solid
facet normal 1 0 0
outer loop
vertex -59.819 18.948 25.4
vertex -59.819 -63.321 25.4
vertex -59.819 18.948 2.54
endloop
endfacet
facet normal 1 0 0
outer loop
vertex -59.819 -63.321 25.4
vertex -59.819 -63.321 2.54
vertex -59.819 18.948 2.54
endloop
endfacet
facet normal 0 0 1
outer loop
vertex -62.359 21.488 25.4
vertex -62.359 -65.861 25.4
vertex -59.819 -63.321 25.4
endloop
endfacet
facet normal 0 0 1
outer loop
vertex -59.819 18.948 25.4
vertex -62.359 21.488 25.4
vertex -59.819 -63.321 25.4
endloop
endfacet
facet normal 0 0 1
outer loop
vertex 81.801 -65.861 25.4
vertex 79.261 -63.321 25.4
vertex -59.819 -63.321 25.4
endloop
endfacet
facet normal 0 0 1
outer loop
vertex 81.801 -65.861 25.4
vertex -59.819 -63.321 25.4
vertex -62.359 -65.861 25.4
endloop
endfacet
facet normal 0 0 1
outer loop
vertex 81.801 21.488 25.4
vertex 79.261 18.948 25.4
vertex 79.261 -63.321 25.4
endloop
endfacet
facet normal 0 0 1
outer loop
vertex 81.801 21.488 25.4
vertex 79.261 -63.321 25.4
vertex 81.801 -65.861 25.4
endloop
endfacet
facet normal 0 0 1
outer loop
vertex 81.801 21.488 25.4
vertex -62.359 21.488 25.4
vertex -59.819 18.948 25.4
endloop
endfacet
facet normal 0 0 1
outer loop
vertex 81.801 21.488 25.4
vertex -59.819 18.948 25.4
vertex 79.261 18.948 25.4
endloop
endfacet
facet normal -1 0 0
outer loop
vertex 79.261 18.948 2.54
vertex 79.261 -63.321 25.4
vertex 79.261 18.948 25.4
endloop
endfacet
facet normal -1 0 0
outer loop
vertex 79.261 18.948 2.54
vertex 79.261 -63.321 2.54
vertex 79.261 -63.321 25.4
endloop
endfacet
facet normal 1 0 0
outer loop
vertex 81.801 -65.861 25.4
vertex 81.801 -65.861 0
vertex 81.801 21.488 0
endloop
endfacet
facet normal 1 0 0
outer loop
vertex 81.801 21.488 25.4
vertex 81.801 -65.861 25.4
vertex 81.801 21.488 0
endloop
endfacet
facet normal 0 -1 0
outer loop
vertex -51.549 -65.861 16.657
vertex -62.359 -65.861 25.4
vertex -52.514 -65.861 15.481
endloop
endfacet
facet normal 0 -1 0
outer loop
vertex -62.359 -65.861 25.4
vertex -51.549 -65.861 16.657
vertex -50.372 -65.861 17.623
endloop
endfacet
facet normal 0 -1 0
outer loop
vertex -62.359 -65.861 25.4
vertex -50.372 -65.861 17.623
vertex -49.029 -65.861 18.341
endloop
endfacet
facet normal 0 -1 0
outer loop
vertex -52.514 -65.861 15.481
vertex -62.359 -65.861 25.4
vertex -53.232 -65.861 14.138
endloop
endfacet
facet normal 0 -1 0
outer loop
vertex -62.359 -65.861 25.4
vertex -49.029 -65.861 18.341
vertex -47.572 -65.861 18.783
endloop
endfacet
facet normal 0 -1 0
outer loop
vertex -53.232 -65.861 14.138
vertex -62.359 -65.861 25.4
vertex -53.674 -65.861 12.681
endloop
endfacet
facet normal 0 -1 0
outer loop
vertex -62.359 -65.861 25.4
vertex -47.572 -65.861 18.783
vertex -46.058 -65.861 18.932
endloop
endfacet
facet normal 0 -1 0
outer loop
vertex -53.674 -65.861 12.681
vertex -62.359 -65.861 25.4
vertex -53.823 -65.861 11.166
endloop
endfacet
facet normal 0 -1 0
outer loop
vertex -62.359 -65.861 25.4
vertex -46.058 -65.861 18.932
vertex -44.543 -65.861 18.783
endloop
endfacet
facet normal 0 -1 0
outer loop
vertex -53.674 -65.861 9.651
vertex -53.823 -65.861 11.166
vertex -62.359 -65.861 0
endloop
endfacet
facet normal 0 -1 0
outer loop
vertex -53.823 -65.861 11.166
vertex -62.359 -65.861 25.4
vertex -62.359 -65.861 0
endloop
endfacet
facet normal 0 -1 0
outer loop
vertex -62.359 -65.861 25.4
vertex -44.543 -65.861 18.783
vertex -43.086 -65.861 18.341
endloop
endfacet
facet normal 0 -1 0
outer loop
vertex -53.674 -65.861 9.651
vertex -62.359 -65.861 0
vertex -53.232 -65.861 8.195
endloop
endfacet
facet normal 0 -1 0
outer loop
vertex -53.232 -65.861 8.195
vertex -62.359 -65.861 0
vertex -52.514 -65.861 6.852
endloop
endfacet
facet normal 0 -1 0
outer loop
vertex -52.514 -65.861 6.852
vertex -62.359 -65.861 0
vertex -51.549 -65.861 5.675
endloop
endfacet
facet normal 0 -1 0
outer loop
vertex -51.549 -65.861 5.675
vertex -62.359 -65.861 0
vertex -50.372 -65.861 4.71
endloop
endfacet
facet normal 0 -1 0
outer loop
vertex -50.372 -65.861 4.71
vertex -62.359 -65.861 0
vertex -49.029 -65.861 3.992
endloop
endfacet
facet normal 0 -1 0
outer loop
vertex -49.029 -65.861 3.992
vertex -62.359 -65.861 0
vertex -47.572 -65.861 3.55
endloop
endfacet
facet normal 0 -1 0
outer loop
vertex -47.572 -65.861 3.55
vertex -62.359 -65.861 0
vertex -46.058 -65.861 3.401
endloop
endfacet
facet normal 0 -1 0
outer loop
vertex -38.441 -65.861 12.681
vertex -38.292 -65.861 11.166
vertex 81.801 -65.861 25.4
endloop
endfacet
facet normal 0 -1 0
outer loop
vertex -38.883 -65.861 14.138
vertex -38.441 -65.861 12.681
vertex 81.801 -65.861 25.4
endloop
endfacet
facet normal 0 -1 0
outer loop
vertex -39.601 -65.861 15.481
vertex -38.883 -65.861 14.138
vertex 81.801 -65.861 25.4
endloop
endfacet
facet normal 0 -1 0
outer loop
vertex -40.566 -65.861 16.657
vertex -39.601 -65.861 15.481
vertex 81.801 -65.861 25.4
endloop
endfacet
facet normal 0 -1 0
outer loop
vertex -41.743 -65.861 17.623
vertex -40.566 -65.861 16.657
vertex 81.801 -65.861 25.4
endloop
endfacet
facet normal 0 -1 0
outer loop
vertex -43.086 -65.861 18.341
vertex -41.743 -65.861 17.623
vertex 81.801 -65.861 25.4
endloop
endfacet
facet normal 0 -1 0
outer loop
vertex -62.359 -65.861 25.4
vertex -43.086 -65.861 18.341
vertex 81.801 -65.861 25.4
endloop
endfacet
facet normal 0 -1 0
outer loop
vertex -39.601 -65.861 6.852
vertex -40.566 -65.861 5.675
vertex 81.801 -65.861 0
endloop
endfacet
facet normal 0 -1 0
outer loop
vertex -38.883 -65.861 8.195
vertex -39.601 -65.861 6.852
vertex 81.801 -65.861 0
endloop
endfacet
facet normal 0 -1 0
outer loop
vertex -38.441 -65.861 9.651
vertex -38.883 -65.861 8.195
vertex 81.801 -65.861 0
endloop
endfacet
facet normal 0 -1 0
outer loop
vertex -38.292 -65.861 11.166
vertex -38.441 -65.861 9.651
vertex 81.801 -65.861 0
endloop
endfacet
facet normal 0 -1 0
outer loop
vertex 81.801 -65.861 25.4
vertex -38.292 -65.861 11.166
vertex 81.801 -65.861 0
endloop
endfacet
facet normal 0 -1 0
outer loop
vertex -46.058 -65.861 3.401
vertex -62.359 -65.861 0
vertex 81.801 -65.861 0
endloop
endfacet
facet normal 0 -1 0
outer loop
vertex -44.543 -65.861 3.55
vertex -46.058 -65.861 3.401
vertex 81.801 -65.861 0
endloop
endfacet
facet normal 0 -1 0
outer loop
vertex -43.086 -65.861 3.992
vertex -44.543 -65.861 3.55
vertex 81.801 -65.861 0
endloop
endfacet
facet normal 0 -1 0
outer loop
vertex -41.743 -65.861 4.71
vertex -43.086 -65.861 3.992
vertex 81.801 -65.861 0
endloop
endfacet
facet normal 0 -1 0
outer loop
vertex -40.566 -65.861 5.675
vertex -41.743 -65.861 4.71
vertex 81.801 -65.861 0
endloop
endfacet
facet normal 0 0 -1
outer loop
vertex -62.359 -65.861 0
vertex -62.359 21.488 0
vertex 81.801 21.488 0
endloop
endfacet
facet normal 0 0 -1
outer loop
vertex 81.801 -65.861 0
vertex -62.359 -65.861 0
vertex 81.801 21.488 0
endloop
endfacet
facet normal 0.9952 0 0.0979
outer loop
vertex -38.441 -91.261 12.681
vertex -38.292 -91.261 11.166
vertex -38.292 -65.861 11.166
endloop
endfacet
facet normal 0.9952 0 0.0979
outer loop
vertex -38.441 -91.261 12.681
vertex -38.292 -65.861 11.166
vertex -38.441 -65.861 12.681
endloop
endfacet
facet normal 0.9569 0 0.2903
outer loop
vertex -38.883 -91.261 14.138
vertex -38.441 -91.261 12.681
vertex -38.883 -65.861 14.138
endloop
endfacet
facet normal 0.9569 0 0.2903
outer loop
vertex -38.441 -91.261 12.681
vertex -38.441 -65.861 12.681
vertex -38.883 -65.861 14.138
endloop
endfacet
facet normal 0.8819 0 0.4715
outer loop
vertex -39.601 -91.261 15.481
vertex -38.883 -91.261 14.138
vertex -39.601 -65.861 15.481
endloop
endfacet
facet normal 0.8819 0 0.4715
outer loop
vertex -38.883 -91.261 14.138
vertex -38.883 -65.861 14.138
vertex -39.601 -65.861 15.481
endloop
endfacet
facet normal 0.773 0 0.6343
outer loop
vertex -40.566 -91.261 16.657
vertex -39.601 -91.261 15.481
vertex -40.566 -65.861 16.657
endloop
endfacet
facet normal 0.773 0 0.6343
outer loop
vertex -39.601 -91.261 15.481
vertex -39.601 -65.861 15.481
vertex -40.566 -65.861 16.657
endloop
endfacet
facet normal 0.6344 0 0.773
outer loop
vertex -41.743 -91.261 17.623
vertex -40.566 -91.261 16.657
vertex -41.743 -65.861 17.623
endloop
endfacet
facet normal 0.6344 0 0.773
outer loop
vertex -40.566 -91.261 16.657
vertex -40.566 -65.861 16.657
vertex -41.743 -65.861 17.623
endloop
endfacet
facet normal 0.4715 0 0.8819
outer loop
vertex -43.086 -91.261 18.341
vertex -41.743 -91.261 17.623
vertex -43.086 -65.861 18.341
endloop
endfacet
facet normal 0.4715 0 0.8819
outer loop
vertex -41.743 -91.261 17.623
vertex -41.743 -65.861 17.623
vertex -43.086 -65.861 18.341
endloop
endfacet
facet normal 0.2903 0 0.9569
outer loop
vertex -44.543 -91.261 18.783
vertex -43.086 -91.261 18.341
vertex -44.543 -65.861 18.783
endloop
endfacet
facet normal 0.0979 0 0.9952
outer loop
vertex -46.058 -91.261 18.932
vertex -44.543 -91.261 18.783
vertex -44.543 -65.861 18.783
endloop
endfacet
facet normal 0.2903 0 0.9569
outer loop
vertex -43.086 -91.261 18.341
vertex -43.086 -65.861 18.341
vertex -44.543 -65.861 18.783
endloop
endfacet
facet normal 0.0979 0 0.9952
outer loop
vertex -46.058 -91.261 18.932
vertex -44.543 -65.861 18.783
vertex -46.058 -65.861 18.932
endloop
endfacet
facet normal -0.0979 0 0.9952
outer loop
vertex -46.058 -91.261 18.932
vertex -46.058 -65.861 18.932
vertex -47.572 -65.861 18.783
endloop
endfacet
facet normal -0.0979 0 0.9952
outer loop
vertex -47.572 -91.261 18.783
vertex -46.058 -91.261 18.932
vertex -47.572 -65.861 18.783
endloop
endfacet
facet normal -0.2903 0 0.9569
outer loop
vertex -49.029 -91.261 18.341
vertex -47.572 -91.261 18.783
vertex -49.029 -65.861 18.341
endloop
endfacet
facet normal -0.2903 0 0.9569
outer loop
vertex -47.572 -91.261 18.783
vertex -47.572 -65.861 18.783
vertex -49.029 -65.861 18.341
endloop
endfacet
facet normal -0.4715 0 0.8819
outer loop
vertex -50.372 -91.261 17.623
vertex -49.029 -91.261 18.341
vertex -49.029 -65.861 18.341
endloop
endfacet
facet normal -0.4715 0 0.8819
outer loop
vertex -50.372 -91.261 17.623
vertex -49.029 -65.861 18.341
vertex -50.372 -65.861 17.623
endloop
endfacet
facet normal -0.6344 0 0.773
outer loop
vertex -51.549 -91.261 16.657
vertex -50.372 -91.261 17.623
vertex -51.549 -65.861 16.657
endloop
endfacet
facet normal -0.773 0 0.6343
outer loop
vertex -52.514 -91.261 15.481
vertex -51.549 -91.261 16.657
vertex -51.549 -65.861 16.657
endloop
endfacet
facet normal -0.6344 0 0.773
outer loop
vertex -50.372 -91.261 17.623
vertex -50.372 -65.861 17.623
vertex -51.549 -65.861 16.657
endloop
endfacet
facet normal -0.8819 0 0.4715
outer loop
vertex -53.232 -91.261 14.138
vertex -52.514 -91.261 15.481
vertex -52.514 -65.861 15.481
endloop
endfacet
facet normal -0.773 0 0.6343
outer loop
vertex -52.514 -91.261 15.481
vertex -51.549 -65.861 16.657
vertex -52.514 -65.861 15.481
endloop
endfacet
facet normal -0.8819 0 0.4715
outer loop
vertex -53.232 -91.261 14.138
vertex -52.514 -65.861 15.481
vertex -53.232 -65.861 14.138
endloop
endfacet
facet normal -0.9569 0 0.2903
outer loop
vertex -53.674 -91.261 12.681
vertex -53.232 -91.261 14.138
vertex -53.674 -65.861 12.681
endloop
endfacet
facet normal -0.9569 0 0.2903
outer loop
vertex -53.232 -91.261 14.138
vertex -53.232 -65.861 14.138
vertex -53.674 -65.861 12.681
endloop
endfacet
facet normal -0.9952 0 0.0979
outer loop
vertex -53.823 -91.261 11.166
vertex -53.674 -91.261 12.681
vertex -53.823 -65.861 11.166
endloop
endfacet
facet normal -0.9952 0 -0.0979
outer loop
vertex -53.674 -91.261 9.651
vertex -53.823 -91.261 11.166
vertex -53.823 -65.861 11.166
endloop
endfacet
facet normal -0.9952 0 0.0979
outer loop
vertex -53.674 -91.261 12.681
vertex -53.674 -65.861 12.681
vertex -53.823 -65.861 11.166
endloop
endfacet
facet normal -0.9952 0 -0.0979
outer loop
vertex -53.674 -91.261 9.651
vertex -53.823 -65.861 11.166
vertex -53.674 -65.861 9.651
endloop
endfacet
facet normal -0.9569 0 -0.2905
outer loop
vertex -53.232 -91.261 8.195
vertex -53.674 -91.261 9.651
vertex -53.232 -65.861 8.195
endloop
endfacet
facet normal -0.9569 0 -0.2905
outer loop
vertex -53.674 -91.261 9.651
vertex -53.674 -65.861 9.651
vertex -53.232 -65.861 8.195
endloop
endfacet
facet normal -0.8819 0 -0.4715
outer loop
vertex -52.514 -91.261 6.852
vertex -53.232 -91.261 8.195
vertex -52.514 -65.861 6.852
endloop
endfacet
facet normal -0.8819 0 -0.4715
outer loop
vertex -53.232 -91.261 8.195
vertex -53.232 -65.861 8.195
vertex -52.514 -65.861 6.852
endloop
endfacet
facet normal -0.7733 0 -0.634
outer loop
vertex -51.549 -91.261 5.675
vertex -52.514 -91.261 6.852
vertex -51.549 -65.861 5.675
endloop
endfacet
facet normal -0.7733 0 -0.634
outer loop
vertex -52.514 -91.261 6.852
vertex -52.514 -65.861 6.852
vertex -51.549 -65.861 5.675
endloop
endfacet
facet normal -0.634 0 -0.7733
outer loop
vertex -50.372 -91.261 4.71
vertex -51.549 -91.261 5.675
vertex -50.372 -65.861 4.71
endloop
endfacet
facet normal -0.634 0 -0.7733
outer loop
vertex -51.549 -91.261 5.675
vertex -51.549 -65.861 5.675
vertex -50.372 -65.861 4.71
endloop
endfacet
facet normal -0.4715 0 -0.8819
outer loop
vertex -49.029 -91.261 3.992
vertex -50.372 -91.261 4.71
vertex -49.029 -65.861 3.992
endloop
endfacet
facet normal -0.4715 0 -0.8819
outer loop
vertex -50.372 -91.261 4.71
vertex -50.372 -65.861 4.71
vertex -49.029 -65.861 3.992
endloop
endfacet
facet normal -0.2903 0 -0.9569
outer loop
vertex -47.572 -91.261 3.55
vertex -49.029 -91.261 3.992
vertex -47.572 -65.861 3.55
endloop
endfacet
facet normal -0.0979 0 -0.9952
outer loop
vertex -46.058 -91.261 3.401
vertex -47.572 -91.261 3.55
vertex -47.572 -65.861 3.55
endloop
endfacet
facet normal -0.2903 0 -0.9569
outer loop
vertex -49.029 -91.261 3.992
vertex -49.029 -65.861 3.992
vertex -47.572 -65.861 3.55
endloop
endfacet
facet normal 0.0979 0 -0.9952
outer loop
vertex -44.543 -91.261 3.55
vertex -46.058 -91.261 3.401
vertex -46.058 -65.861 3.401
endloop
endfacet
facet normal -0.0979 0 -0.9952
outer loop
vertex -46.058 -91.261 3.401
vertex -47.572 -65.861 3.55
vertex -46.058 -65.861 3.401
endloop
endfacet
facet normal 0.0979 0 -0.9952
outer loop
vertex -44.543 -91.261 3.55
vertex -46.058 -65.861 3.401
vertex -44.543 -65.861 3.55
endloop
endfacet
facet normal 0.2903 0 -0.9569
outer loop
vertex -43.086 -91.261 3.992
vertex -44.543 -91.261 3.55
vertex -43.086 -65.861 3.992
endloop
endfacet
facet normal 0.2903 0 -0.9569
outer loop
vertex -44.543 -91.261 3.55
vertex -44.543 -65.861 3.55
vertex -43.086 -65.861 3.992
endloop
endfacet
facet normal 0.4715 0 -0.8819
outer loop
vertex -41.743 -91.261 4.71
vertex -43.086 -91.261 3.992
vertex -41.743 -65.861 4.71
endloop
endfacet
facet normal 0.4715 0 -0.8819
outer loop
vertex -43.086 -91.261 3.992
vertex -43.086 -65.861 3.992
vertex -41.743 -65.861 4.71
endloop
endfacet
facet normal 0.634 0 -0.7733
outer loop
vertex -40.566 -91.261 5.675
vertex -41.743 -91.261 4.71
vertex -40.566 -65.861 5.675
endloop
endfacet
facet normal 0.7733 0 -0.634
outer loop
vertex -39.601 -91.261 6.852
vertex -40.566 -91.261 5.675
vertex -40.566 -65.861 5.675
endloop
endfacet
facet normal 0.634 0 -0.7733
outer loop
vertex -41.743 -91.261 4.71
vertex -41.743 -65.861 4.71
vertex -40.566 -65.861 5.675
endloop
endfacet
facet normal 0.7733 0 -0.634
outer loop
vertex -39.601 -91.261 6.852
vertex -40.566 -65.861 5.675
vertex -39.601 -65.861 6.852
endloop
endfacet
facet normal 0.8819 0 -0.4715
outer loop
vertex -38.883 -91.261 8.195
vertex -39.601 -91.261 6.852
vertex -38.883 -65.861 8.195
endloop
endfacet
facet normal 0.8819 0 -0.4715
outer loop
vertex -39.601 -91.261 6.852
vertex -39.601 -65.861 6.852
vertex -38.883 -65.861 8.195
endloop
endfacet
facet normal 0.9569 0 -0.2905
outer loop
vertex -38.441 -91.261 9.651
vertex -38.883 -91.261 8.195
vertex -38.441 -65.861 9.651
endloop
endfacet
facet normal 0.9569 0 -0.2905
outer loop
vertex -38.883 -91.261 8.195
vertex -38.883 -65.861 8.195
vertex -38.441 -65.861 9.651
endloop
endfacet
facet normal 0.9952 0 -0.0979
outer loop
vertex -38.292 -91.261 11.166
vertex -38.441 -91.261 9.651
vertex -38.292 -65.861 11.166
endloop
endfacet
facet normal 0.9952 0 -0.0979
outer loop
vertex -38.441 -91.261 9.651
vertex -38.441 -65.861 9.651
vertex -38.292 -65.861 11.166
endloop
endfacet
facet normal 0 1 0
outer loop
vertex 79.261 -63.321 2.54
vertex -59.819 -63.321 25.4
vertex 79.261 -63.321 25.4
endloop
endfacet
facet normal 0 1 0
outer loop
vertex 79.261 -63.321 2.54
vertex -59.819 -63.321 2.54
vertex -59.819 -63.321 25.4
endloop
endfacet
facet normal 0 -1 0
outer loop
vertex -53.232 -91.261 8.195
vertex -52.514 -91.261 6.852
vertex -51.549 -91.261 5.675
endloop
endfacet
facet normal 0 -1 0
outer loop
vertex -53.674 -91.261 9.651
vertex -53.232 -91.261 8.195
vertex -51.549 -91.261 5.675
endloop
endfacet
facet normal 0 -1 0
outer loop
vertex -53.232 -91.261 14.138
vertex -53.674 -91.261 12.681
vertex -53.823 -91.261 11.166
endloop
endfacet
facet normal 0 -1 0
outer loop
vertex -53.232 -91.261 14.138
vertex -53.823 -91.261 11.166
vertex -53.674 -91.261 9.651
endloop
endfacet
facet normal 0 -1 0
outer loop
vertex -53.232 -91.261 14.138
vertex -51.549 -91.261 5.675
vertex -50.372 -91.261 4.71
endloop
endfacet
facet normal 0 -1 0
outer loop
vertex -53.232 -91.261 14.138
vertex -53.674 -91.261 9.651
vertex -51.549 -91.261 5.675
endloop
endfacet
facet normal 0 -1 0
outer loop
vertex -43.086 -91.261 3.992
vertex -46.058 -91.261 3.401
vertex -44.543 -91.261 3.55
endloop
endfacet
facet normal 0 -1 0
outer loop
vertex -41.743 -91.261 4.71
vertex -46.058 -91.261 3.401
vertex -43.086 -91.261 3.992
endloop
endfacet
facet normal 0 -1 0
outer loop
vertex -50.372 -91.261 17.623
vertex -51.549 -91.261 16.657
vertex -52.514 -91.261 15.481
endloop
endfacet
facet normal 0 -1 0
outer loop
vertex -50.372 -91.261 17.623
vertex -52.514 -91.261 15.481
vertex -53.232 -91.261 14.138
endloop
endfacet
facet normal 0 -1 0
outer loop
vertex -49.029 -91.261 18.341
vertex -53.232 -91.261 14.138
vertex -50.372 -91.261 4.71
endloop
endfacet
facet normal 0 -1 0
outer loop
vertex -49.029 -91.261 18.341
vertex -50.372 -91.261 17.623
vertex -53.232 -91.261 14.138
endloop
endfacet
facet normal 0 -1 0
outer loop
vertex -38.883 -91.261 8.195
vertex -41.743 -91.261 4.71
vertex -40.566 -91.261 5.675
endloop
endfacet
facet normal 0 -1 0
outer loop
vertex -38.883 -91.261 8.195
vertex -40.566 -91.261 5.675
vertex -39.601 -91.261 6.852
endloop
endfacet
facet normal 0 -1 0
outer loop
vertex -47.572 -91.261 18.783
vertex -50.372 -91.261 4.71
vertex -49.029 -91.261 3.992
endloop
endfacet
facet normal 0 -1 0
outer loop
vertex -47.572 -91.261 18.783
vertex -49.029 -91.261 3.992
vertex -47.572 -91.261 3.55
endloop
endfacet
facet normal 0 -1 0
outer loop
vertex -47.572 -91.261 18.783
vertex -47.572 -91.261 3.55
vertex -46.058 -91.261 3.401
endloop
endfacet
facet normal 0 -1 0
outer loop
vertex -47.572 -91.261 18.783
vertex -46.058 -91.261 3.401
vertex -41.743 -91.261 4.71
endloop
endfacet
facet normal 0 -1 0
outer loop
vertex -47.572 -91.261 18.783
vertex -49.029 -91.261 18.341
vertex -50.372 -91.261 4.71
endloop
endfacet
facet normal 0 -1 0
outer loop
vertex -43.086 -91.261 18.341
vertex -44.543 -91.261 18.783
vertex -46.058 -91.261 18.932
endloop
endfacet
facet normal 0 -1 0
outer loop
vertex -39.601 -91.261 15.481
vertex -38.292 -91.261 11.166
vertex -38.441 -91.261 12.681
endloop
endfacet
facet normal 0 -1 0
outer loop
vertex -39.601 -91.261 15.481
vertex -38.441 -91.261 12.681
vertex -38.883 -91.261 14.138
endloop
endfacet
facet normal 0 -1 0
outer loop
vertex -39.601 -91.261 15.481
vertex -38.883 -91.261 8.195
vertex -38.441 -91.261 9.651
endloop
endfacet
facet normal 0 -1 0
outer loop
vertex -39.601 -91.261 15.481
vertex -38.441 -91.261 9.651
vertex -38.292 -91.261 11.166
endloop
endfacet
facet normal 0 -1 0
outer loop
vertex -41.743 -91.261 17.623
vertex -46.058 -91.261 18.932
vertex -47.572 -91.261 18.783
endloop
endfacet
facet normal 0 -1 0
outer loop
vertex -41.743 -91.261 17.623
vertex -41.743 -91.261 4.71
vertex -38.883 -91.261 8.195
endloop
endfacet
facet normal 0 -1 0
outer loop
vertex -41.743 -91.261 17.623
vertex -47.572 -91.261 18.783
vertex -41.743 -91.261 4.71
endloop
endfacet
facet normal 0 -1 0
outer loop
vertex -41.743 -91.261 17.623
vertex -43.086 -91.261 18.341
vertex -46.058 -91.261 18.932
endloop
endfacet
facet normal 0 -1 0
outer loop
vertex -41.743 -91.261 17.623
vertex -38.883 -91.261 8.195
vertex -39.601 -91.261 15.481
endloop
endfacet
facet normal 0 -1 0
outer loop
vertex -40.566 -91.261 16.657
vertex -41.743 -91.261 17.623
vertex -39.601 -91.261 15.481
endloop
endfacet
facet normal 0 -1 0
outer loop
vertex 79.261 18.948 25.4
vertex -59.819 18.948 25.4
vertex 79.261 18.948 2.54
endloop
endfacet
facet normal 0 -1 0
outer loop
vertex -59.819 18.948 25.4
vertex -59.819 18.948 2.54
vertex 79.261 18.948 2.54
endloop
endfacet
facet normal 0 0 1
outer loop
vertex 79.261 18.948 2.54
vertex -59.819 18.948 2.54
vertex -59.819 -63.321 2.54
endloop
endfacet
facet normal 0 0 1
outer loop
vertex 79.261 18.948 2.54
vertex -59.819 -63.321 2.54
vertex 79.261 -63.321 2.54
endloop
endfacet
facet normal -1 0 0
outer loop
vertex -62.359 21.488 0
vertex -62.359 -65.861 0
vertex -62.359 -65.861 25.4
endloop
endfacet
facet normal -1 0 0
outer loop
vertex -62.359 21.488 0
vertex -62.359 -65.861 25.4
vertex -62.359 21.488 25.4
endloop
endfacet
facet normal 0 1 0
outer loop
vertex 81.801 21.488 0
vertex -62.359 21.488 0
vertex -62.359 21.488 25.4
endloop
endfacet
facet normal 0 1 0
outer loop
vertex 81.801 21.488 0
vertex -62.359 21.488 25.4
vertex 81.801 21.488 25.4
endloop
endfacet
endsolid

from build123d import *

# Parameters (mm, degrees)
F0_W     = 144.1599577665
F0_H     = 87.3491168022
F1_DEPTH = 25.4
F2_T     = -2.54
F3_R     = 7.7655304072
F4_DEPTH = 25.4


with BuildPart() as f1:
    # F0 (on Top) → F1 (new body)
    with BuildSketch(Plane.XY):
        with Locations((9.7206383944, -22.1865028143)):
            Rectangle(F0_W, F0_H)
    extrude(amount=F1_DEPTH)

    # F2
    f2_openings = [f1.faces().sort_by_distance(p)[0] for p in [
        (9.720638, -22.186503, 25.4),
    ]]
    offset(amount=F2_T, openings=f2_openings)

    # F3 (on face) → F4 (join)
    with BuildSketch(Plane.XZ.offset(65.8610612154)):
        with Locations((-46.0575036705, 11.1663378775)):
            Circle(F3_R)
    extrude(amount=F4_DEPTH)


solid = f1.part
